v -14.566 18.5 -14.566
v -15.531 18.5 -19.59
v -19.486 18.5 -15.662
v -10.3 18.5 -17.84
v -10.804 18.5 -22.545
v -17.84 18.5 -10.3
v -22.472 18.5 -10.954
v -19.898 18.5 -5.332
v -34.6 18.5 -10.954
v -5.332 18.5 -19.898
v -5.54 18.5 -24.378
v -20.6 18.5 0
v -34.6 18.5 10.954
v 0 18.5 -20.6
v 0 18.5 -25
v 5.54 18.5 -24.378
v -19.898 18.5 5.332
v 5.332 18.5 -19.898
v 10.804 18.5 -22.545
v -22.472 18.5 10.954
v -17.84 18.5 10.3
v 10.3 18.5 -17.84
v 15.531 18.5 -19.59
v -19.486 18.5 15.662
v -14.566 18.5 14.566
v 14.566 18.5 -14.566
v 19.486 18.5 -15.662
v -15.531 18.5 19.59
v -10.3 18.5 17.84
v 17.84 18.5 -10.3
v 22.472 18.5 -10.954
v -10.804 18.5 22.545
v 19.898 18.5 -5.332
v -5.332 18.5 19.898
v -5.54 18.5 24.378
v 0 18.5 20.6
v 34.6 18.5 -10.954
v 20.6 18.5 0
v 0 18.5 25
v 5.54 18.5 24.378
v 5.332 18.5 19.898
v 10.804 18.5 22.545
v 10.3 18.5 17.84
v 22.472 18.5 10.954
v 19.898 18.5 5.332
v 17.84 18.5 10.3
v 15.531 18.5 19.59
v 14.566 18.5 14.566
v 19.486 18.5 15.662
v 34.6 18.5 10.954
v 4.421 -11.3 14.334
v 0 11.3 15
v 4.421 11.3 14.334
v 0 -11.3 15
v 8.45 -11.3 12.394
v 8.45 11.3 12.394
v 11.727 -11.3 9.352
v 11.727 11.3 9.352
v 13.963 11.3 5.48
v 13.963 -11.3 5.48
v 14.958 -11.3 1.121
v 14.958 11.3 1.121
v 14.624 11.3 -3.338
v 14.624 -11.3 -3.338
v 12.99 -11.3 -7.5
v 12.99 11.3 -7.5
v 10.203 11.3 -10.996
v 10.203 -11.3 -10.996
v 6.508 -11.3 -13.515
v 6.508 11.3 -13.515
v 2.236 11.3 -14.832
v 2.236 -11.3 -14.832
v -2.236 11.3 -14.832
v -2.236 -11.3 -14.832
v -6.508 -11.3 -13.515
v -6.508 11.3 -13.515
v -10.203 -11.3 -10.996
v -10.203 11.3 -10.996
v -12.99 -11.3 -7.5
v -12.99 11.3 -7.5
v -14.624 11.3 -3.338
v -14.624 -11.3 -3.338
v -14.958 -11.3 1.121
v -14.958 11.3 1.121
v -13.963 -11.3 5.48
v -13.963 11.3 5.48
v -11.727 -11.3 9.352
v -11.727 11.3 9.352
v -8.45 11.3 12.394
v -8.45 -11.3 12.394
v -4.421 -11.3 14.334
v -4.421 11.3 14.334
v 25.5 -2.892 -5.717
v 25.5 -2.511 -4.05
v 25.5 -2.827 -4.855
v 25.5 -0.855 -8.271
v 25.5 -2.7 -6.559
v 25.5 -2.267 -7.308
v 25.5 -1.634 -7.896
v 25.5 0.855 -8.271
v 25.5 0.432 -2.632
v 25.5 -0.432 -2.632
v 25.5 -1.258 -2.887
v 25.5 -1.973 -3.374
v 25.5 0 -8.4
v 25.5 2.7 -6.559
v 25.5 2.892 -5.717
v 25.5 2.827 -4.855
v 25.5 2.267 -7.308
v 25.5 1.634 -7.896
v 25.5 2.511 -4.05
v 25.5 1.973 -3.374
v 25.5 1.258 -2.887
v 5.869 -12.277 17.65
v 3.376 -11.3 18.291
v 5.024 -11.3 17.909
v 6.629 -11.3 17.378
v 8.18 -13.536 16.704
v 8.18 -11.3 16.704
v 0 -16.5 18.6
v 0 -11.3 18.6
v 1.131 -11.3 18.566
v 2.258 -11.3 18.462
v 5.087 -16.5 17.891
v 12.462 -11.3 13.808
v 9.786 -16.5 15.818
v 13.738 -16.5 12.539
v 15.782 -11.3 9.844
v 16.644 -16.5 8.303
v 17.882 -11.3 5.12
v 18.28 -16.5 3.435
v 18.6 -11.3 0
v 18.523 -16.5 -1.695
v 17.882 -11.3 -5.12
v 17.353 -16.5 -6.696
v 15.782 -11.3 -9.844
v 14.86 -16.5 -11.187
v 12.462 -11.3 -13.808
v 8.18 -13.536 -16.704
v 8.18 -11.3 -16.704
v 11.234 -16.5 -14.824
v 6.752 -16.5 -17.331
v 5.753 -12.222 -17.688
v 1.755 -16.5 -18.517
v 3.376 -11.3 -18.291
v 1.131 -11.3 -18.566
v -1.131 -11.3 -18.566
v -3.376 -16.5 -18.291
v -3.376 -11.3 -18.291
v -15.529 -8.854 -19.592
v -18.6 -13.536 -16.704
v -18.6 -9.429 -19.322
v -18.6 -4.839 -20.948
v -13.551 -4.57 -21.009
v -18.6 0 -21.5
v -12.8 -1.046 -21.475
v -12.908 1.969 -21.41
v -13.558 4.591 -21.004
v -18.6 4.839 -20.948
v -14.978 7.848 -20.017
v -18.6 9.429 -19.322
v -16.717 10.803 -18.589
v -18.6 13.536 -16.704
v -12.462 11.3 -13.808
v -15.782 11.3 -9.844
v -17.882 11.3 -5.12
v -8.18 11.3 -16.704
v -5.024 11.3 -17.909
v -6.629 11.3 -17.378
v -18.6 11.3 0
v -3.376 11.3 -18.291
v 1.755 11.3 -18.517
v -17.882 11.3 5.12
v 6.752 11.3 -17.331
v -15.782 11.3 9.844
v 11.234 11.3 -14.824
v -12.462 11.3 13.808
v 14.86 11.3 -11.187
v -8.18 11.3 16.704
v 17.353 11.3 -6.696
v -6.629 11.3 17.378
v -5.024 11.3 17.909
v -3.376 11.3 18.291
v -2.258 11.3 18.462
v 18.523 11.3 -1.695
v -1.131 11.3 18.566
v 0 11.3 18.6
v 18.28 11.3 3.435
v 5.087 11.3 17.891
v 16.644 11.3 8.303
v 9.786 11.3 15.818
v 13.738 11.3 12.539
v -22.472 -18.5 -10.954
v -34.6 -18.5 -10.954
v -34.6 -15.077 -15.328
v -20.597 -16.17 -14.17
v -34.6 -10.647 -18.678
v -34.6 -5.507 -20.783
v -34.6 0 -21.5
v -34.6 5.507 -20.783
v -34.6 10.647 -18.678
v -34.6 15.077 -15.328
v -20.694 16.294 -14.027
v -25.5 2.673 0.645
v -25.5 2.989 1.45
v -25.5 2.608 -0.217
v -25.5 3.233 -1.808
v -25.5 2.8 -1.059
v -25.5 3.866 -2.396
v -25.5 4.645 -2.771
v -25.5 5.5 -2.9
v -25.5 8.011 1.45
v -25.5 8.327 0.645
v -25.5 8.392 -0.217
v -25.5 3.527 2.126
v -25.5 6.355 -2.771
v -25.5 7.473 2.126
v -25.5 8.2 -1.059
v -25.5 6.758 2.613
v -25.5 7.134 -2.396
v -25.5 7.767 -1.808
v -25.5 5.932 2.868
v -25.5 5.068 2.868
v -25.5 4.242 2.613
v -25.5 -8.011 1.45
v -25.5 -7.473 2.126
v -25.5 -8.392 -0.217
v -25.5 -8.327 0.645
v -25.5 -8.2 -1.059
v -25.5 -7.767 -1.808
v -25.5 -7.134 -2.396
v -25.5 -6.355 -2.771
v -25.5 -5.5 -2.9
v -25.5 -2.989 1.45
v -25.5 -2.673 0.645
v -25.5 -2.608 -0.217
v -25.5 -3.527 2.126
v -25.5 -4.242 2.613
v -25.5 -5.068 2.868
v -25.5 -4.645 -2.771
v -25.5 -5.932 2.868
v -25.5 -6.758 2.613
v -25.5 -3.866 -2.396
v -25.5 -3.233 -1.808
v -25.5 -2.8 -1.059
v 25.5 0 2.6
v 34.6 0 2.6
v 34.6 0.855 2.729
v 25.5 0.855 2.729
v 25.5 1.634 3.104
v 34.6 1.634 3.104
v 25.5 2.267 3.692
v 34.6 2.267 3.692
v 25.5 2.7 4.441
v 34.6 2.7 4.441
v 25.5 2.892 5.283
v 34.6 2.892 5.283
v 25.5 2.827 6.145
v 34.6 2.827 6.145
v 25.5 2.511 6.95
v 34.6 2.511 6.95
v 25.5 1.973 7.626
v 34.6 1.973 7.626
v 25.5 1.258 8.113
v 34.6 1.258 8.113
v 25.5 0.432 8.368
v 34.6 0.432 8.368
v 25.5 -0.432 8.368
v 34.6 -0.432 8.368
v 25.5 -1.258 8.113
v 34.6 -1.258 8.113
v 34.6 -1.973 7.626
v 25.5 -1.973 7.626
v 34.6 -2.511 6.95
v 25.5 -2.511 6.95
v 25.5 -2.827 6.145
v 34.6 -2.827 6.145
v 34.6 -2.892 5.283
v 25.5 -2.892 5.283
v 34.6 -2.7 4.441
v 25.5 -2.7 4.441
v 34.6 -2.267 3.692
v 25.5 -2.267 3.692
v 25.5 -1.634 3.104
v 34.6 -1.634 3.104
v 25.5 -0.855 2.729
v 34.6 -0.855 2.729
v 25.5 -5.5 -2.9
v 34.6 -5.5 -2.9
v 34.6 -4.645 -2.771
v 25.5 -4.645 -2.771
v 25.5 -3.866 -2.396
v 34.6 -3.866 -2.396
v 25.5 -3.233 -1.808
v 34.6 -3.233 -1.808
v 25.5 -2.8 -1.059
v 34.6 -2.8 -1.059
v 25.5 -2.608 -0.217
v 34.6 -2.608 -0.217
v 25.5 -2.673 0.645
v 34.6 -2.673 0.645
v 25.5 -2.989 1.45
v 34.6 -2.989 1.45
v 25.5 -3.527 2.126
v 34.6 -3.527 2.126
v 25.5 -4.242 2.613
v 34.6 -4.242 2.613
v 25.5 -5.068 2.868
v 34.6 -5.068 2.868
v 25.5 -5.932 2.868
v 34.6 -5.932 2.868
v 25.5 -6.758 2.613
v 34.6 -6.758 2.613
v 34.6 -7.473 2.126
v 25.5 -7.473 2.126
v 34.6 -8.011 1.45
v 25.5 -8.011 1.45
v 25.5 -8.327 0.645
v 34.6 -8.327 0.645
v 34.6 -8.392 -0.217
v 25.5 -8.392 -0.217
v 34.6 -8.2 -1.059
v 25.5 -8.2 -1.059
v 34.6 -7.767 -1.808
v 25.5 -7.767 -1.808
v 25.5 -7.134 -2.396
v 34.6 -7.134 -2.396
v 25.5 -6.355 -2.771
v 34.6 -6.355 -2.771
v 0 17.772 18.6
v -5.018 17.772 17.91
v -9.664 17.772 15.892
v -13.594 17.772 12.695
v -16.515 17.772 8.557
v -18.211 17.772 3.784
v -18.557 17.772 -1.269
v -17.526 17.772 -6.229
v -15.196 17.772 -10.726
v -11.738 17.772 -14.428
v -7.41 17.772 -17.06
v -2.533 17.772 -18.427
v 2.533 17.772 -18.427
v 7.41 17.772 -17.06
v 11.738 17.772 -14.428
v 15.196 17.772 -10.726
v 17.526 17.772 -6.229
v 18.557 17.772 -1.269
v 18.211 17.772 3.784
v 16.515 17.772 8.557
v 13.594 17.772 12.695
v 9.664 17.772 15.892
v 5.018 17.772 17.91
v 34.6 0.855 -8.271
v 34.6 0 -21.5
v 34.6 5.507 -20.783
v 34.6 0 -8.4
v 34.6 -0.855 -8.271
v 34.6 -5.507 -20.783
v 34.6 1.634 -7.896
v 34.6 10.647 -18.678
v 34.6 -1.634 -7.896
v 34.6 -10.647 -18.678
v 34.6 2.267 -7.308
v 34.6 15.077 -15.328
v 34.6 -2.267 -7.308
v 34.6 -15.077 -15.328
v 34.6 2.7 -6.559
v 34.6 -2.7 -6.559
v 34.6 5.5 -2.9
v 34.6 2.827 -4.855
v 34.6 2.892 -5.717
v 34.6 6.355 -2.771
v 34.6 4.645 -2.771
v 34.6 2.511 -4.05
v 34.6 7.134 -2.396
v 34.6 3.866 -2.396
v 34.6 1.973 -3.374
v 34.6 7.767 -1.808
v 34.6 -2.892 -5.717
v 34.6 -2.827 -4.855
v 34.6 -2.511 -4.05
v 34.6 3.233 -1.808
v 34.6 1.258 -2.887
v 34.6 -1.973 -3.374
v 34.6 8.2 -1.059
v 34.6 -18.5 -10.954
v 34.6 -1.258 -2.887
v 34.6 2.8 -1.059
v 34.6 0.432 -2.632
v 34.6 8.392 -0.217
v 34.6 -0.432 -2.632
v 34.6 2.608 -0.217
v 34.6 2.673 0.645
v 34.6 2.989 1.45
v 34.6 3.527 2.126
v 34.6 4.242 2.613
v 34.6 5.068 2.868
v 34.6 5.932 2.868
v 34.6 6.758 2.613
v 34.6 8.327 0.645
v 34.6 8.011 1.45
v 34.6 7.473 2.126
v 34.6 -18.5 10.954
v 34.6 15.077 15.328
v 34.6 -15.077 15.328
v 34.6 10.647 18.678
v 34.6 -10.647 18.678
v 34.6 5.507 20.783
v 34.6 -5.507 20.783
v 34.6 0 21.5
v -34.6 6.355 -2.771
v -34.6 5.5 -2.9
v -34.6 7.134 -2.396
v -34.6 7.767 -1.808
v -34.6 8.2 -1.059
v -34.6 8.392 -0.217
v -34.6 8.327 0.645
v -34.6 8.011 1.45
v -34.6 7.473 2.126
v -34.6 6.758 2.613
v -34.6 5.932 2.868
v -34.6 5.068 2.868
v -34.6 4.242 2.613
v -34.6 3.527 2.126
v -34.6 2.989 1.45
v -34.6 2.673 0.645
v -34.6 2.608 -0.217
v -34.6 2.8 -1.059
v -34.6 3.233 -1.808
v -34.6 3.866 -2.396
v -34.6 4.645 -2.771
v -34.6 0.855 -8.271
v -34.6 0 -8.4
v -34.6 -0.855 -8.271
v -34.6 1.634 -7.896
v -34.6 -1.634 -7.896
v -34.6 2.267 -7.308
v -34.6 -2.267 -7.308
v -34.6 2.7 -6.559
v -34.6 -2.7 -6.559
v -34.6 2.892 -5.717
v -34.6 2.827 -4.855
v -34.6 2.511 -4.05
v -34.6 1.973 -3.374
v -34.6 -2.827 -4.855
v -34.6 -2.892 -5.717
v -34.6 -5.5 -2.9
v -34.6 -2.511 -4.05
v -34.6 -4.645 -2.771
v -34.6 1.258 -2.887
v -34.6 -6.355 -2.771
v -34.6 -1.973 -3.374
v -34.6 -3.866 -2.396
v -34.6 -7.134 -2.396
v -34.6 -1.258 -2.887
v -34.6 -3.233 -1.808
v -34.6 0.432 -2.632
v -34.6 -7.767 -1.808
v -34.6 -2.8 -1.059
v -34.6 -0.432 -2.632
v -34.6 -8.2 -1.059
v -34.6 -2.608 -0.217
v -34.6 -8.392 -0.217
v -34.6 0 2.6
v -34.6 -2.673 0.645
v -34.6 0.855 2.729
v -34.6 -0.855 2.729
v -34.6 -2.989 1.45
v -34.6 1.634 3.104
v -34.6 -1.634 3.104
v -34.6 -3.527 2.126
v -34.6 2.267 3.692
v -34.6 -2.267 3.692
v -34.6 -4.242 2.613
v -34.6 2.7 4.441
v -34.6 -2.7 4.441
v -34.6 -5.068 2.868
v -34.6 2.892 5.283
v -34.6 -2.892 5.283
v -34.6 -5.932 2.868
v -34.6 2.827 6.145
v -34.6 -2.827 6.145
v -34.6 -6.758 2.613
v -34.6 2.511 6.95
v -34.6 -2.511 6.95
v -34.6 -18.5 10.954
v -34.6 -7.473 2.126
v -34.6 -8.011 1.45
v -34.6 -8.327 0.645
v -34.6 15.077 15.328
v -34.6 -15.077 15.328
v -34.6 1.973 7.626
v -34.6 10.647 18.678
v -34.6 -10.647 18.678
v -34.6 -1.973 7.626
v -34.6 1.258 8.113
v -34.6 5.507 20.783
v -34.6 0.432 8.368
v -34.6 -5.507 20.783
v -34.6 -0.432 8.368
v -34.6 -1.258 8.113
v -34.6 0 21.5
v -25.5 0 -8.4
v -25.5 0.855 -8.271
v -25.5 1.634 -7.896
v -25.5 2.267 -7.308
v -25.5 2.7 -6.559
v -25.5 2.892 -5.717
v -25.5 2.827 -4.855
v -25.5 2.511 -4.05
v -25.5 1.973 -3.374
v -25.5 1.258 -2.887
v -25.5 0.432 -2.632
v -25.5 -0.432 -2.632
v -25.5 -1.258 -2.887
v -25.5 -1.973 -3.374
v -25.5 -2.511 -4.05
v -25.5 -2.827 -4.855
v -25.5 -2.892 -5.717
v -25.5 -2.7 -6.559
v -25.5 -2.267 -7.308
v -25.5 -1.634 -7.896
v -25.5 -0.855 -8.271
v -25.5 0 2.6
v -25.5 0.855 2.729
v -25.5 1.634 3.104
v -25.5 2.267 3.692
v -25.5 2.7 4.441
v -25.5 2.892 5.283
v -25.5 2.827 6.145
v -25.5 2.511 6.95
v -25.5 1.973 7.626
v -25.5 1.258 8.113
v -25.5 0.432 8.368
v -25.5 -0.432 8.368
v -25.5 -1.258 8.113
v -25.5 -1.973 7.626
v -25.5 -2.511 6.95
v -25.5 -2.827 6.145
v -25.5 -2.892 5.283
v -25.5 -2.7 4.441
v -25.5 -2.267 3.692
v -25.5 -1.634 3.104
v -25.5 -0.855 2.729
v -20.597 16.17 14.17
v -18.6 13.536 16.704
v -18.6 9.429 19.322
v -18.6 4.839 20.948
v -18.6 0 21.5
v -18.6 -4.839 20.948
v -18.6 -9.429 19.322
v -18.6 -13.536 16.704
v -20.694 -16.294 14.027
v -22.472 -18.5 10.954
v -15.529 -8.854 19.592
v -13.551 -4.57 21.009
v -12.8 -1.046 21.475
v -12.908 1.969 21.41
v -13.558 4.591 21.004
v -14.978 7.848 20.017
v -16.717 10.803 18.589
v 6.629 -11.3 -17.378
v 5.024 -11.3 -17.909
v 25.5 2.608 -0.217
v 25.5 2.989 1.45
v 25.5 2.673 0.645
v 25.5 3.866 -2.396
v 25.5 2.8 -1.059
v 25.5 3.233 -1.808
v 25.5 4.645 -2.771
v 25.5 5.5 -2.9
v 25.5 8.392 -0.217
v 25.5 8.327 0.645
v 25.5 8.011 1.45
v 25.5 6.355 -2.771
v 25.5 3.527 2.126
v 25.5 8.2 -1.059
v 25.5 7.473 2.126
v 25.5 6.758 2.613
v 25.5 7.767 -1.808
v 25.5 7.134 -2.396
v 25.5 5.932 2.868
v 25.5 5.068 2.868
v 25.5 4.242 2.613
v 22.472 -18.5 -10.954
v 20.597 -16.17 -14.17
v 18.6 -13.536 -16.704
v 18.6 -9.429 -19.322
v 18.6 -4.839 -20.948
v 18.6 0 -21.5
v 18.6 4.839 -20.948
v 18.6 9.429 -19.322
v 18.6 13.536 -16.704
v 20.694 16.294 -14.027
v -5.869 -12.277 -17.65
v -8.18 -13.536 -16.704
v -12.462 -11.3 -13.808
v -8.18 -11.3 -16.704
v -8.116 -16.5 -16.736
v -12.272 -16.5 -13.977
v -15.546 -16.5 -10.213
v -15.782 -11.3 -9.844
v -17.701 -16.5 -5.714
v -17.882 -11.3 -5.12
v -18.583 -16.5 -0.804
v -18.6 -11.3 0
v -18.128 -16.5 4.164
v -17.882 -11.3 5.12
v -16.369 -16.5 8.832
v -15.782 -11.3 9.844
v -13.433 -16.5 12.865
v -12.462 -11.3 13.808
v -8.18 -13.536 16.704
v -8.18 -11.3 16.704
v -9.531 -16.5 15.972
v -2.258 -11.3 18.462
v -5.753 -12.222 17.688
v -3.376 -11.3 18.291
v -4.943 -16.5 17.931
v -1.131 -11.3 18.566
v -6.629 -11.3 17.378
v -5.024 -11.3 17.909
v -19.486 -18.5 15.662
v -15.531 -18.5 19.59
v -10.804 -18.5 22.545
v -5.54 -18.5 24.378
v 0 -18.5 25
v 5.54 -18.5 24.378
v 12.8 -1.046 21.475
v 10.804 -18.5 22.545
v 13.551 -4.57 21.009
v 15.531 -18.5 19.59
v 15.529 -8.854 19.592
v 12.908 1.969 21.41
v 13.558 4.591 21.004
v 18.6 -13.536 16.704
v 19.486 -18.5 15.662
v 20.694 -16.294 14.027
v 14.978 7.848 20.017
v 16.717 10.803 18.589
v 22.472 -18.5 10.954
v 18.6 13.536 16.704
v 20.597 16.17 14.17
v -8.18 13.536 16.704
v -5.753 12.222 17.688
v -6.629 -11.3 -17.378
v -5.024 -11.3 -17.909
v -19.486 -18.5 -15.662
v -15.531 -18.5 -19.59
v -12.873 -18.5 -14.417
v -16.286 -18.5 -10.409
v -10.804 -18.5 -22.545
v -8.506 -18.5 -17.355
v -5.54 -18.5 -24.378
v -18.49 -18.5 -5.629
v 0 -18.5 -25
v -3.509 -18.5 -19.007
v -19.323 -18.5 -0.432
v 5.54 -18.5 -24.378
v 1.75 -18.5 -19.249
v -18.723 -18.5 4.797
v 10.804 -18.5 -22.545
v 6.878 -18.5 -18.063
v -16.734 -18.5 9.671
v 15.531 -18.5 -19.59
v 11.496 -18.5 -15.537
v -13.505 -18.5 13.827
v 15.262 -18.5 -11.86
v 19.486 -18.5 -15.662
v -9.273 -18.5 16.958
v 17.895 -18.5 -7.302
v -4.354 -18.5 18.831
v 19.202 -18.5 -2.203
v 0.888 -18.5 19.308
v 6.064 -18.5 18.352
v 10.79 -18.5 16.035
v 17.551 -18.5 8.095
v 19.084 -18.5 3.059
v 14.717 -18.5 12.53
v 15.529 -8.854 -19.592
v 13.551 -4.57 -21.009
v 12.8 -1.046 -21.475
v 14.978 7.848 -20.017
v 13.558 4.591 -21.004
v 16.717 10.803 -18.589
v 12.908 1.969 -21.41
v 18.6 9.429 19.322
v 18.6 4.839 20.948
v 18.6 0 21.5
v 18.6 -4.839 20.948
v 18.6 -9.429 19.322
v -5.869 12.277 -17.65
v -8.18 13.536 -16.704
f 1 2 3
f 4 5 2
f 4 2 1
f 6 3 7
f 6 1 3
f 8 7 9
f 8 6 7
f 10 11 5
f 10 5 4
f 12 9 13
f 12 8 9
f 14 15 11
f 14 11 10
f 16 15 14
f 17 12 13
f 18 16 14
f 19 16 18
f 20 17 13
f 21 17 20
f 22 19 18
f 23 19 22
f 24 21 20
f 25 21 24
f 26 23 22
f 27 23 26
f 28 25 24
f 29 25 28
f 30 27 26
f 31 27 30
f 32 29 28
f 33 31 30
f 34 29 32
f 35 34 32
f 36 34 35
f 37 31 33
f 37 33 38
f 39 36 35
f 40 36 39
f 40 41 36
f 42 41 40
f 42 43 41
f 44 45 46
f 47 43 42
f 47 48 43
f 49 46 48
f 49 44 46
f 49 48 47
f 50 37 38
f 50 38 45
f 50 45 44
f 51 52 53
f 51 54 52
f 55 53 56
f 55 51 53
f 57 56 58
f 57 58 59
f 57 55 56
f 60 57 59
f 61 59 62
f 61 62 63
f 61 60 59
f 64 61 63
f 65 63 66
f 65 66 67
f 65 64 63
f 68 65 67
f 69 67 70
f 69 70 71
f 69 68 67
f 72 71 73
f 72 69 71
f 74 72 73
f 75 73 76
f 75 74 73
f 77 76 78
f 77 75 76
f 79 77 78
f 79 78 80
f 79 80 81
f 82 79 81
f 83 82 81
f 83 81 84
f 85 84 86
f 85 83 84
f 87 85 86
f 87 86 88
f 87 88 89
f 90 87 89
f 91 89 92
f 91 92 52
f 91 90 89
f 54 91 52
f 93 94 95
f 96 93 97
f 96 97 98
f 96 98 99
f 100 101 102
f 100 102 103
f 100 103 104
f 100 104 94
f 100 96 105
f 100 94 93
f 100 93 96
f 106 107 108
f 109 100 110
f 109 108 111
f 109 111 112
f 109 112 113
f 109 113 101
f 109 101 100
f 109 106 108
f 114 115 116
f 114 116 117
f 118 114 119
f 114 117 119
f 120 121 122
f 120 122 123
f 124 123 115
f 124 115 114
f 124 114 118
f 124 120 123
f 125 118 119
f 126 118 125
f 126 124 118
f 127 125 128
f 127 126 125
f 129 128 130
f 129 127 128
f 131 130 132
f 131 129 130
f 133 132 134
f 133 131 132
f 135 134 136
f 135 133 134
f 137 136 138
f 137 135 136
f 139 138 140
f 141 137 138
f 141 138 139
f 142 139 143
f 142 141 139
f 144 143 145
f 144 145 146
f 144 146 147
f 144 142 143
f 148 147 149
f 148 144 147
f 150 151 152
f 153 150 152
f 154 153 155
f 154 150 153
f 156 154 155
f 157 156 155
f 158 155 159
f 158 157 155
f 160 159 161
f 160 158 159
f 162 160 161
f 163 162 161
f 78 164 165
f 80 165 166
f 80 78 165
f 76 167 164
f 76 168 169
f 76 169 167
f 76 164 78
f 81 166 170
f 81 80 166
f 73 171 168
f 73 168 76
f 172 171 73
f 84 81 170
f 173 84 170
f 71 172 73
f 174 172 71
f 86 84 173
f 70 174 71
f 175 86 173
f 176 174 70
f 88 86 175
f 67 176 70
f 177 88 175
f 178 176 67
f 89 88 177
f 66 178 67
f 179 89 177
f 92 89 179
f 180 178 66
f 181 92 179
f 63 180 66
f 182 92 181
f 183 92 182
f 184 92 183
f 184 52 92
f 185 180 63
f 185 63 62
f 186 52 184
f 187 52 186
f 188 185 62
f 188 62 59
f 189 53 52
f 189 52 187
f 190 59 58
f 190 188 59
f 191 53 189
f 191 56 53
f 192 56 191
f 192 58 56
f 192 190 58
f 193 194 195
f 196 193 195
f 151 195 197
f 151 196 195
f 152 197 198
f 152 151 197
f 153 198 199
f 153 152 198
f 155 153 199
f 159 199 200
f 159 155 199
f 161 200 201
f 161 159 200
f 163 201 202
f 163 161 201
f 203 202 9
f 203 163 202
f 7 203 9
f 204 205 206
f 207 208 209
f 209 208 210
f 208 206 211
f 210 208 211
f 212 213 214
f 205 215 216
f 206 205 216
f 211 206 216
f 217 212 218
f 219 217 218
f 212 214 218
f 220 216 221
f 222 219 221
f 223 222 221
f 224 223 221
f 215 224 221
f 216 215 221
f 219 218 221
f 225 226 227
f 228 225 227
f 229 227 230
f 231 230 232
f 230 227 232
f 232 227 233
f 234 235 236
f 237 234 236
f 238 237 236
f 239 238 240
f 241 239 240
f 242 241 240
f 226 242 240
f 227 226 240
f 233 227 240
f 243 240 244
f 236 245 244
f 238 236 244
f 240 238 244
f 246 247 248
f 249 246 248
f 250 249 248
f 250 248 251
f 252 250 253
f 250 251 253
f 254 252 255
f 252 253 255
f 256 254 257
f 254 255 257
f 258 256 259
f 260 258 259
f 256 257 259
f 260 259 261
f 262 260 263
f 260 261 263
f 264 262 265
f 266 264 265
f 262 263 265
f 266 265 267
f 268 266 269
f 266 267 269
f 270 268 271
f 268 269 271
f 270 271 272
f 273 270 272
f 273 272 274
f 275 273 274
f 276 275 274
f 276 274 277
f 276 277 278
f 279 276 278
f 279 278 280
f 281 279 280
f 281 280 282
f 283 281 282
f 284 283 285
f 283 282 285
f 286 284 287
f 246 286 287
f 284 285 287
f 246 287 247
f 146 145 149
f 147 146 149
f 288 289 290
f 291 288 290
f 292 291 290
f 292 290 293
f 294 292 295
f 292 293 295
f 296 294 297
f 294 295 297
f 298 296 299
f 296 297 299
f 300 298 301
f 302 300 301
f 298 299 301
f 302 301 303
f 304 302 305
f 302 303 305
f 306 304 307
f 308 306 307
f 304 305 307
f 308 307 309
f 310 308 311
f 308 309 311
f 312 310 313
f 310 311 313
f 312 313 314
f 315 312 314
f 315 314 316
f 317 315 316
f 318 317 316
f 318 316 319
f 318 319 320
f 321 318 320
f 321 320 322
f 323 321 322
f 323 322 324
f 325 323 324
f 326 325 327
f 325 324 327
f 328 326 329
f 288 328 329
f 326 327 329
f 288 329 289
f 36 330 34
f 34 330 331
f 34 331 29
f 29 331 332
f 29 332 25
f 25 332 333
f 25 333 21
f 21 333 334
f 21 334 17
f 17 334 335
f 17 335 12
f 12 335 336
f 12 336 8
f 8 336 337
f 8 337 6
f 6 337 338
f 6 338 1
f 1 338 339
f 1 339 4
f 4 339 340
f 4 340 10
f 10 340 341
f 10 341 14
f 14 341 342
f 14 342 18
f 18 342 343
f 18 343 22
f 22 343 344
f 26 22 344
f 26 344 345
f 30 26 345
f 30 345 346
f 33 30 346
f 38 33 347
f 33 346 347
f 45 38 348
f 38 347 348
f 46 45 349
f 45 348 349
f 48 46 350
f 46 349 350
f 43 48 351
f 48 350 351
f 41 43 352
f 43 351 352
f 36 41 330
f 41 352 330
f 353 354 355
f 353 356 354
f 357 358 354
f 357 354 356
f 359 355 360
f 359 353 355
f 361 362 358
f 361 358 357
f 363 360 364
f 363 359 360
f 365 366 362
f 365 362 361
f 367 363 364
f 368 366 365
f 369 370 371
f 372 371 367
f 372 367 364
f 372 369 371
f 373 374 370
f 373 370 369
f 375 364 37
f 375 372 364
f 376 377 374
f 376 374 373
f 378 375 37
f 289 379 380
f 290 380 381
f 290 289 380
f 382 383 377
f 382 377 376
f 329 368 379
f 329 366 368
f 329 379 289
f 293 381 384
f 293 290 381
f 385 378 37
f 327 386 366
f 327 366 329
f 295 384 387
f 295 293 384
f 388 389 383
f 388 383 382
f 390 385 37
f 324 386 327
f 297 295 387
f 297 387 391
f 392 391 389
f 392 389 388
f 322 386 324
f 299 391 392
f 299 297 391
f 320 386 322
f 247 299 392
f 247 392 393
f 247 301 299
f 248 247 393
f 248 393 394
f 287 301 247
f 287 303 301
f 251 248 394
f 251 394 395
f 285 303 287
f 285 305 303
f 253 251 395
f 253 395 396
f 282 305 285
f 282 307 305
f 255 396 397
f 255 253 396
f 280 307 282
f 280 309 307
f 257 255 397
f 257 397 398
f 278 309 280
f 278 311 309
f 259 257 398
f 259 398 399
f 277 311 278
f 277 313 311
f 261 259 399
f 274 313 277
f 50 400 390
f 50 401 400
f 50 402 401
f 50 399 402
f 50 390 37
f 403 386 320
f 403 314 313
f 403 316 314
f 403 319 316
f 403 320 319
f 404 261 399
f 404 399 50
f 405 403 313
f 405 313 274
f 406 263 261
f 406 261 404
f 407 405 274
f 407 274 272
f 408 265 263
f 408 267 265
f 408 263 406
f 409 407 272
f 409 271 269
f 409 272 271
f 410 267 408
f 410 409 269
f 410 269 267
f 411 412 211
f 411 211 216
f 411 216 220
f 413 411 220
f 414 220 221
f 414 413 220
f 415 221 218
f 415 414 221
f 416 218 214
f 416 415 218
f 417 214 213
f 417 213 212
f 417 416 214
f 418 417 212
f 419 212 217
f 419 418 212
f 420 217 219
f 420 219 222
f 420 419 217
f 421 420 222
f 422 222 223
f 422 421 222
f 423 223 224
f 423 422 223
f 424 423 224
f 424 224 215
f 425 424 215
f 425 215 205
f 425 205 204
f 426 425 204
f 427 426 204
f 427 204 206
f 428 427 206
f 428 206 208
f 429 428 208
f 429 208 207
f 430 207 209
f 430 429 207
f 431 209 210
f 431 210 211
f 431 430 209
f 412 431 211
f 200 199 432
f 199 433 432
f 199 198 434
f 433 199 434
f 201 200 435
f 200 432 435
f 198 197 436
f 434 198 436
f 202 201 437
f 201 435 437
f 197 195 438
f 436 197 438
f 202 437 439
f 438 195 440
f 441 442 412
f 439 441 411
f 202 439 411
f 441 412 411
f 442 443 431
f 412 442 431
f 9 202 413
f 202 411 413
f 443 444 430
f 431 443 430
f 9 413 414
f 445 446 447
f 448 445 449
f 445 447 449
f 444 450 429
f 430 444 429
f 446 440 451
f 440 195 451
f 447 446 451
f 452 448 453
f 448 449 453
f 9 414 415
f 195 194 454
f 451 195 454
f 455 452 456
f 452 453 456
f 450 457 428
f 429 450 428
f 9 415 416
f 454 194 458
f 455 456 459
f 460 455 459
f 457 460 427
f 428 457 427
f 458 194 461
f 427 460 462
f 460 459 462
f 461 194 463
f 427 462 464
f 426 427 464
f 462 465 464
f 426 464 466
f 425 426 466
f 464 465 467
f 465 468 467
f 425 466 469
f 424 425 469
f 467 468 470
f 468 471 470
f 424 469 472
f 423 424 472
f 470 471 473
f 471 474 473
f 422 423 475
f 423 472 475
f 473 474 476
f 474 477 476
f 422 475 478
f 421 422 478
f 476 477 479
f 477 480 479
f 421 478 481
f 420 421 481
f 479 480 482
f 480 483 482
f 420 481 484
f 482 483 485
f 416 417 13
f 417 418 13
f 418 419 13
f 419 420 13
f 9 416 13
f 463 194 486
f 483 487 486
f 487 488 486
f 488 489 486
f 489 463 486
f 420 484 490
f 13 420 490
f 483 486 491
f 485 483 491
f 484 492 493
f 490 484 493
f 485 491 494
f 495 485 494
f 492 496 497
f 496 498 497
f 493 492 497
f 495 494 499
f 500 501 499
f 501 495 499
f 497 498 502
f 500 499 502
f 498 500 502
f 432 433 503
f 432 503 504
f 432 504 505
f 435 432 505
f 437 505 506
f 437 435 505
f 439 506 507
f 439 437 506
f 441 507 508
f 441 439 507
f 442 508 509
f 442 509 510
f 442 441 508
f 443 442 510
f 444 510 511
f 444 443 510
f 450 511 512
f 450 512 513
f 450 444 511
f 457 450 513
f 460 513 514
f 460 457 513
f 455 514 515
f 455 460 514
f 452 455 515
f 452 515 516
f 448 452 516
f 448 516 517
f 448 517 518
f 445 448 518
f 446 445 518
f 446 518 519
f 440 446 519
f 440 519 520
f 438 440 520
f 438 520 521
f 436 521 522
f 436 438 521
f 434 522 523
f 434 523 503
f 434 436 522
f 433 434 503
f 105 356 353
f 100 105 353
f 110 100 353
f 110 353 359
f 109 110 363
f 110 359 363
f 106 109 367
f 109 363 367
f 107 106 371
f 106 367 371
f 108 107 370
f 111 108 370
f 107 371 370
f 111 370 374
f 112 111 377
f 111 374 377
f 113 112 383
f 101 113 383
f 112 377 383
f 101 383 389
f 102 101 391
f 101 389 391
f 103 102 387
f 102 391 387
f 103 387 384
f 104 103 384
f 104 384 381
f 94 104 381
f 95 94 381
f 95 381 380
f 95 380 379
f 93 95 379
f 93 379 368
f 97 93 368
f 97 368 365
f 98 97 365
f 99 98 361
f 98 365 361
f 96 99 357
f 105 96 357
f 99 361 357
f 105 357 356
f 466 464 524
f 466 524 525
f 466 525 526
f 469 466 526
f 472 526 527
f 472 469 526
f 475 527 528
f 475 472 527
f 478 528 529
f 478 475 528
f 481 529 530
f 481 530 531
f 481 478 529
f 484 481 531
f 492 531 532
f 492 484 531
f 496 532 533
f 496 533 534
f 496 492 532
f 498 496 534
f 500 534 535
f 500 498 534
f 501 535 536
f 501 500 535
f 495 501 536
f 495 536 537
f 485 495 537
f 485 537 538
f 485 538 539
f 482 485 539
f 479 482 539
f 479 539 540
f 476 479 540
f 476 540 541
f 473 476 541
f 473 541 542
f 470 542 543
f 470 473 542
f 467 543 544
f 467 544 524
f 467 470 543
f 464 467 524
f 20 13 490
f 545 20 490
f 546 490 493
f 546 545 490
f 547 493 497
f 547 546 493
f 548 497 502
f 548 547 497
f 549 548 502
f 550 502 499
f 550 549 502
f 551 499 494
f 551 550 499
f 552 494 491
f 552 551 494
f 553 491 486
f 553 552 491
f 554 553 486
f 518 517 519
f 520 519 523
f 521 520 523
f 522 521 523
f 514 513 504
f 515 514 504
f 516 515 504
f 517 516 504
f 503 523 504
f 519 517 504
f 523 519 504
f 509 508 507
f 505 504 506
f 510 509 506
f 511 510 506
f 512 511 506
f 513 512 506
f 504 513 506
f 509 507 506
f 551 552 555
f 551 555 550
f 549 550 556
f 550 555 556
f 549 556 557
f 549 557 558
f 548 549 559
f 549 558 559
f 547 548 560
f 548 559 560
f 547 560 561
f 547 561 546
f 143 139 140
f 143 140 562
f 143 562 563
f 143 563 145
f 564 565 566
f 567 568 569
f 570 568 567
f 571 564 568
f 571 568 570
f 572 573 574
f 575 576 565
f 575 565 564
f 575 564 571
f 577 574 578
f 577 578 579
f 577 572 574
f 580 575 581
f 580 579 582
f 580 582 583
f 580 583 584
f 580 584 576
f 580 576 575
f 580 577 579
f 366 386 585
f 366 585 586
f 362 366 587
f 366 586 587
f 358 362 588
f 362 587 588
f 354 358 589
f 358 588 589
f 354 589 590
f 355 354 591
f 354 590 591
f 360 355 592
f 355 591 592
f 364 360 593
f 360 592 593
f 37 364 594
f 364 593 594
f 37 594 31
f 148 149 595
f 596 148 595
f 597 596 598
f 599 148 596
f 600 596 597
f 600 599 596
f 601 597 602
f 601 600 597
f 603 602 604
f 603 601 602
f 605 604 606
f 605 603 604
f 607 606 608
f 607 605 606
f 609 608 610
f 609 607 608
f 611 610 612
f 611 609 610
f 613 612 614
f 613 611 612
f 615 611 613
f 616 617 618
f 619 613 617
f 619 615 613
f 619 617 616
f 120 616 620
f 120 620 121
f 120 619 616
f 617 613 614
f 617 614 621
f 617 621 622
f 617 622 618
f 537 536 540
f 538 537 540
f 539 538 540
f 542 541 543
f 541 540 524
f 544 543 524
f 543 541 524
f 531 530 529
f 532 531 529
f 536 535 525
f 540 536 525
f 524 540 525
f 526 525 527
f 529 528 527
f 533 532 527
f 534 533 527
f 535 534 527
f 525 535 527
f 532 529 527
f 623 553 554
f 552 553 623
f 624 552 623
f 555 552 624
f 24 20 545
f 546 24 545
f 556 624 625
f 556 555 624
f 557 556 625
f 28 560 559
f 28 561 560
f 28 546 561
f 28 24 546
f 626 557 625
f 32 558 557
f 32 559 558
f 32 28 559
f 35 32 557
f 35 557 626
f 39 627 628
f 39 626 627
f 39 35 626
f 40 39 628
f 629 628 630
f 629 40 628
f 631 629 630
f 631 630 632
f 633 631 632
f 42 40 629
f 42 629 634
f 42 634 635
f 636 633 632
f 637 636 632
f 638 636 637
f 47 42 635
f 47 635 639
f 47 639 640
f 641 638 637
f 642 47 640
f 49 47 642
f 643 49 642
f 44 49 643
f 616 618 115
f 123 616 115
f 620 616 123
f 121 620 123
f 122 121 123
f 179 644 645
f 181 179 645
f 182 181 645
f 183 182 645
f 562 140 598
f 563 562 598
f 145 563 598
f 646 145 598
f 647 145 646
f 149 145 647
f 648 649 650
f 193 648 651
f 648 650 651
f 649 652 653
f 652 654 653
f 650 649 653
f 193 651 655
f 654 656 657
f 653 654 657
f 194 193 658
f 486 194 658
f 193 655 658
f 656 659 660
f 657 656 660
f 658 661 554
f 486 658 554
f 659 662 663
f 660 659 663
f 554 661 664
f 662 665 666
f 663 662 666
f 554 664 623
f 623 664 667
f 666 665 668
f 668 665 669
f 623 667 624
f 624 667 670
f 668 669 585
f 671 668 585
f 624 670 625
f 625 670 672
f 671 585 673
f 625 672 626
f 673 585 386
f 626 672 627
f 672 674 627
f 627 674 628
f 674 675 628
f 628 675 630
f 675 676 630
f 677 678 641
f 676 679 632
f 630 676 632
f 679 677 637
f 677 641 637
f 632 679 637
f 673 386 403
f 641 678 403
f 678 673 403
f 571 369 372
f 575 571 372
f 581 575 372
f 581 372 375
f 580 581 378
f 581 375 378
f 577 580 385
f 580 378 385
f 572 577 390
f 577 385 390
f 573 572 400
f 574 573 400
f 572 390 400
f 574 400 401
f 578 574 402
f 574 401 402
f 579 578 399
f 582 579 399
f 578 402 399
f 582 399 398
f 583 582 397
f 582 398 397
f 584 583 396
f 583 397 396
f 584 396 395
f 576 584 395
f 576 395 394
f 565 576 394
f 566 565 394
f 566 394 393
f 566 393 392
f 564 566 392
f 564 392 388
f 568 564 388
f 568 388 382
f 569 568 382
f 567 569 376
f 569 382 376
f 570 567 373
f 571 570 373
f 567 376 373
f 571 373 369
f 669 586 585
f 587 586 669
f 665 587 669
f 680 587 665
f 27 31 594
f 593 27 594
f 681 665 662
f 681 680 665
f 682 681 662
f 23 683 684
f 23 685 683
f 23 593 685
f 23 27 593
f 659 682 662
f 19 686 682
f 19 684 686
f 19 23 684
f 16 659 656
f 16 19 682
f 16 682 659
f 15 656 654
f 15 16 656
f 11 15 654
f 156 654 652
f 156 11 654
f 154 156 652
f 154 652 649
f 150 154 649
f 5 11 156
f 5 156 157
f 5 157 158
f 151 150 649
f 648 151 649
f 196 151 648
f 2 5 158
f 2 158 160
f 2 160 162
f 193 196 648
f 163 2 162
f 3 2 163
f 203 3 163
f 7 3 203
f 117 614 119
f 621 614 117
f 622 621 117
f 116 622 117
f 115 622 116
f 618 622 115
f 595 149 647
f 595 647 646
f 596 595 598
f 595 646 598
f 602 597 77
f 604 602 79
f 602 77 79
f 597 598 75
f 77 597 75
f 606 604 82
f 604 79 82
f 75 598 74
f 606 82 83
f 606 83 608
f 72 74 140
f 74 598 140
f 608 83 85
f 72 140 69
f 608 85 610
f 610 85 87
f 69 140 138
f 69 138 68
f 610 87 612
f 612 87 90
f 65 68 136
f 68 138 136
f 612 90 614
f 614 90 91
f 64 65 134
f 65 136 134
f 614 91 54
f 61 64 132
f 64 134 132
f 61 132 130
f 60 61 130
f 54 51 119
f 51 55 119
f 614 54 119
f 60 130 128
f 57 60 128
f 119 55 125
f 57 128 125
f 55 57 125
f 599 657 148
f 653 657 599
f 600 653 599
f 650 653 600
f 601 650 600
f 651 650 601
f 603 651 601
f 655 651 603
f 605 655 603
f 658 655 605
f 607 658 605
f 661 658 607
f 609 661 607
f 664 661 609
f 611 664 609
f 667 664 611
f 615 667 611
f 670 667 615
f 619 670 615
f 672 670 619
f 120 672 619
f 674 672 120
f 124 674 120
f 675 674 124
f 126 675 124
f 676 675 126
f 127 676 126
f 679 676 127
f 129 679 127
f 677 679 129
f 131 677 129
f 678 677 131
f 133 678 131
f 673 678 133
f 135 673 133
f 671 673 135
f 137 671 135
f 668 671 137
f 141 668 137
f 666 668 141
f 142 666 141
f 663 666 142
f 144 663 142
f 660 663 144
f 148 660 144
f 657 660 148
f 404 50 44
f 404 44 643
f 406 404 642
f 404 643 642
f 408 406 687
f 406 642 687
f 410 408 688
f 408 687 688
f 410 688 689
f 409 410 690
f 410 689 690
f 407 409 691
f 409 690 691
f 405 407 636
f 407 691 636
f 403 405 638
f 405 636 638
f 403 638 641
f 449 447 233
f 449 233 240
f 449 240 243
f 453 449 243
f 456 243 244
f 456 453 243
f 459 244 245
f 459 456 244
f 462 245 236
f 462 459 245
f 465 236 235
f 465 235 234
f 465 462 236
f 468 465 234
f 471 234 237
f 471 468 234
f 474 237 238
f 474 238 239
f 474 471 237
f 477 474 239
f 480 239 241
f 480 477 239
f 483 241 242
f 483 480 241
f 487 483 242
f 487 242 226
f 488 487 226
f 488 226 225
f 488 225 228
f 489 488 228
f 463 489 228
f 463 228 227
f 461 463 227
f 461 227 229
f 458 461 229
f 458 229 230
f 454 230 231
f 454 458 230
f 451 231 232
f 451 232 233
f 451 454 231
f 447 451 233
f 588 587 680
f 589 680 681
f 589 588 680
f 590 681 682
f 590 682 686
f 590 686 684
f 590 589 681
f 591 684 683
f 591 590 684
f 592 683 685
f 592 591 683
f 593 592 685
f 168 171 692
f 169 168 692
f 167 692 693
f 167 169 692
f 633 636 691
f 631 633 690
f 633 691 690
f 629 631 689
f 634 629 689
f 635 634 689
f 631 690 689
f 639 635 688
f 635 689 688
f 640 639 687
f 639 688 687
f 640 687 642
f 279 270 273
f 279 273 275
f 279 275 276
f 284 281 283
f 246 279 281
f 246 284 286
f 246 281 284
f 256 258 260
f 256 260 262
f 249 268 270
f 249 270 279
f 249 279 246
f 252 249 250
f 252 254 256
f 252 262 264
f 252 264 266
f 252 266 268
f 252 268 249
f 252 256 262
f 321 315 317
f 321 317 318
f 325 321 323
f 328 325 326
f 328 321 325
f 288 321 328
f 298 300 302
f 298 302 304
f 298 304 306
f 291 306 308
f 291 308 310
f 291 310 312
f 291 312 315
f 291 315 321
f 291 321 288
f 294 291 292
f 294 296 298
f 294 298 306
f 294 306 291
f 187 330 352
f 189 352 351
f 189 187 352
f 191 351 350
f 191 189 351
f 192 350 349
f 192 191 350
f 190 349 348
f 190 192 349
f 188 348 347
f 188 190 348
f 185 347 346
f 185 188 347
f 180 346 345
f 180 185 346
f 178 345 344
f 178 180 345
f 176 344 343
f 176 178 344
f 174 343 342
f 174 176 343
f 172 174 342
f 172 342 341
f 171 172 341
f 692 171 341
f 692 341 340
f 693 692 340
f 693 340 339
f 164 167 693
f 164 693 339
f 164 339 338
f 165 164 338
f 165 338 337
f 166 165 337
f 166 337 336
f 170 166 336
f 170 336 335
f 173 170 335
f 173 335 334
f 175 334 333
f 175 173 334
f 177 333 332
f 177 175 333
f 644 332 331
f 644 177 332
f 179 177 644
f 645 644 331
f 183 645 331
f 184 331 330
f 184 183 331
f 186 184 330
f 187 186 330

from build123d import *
from OCP.BRepFilletAPI import BRepFilletAPI_MakeChamfer
from build123d.topology import SkipClean

# Parameters (mm, degrees)
SKIZZE1_R                            = 25
SKIZZE1_R_2                          = 18.6
AUFSATZ_LINEAR_AUSTRAGEN1_DEPTH      = 18.5
SKIZZE2_R                            = 18.6
SKIZZE2_R_2                          = 15
AUFSATZ_LINEAR_AUSTRAGEN2_DEPTH      = 11.3
SKIZZE3_R                            = 21.5
AUFSATZ_LINEAR_AUSTRAGEN3_DEPTH      = 16
SKIZZE4_R                            = 2.9
SCHNITT_LINEAR_AUSTRAGEN1_DEPTH      = 9.1
SKIZZE5_OUTSIDE_W                    = 64.118
SKIZZE5_OUTSIDE_H                    = 71.118
SKIZZE5_OUTSIDE_W_2                  = 37
SKIZZE5_OUTSIDE_H_2                  = 50
SCHNITT_LINEAR_AUSTRAGEN2_DEPTH      = 67.342867843
SCHNITT_LINEAR_AUSTRAGEN2_DEPTH_BACK = 67.342867843
AUFSATZ_LINEAR_AUSTRAGEN4_DEPTH      = 37.2
SKIZZE8_R                            = 18.6
SCHNITT_LINEAR_AUSTRAGEN3_DEPTH      = 53.059581422
FASE1_SIZE                           = 2
FASE1_SIZE2                          = 0.727940469


with BuildPart() as part:
    # Skizze1 → Aufsatz-Linear austragen1 (new, symmetric)
    with BuildSketch(Plane(origin=(0, 0, 0), x_dir=(1, 0, 0), z_dir=(0, 1, 0))):
        with Locations(Location((0, 0, 0), (0, 0, 270))):
            Circle(SKIZZE1_R)
        with Locations(Location((0, 0, 0), (0, 0, 270))):
            Circle(SKIZZE1_R_2, mode=Mode.SUBTRACT)
    extrude(amount=AUFSATZ_LINEAR_AUSTRAGEN1_DEPTH, both=True)

    # Skizze2 → Aufsatz-Linear austragen2 (add, symmetric)
    with BuildSketch(Plane(origin=(0, 0, 0), x_dir=(1, 0, 0), z_dir=(0, 1, 0))):
        with Locations(Location((0, 0, 0), (0, 0, 270))):
            Circle(SKIZZE2_R)
        with Locations(Location((0, 0, 0), (0, 0, 270))):
            Circle(SKIZZE2_R_2, mode=Mode.SUBTRACT)
    extrude(amount=AUFSATZ_LINEAR_AUSTRAGEN2_DEPTH, both=True)

    # Skizze3 → Aufsatz-Linear austragen3 (add)
    with BuildSketch(Plane(origin=(18.6, 0, 0), x_dir=(0, 0, -1), z_dir=(1, 0, 0))):
        with Locations(Location((0, 0, 0), (0, 0, 140.982439232))):
            Circle(SKIZZE3_R)
    aufsatz_linear_austragen3 = extrude(amount=AUFSATZ_LINEAR_AUSTRAGEN3_DEPTH)

    # Skizze4 → Schnitt-Linear austragen1 (cut)
    with BuildSketch(Plane(origin=(34.6, 0, 0), x_dir=(0, 0, -1), z_dir=(1, 0, 0))):
        with Locations((-5.5, 0)):
            Circle(SKIZZE4_R)
        with Locations((0, 5.5)):
            Circle(SKIZZE4_R)
        with Locations((5.5, 0)):
            Circle(SKIZZE4_R)
        with Locations((0, -5.5)):
            Circle(SKIZZE4_R)
    schnitt_linear_austragen1 = extrude(amount=-SCHNITT_LINEAR_AUSTRAGEN1_DEPTH, mode=Mode.SUBTRACT)

    # Spiegeln1: Aufsatz-Linear austragen3, Schnitt-Linear austragen1 across plane
    add(aufsatz_linear_austragen3.mirror(Plane(origin=(0, 0, 0), x_dir=(0, 0, 1), z_dir=(1, 0, 0))))
    add(schnitt_linear_austragen1.mirror(Plane(origin=(0, 0, 0), x_dir=(0, 0, 1), z_dir=(1, 0, 0))), mode=Mode.SUBTRACT)

    # Skizze5 outside → Schnitt-Linear austragen2 (cut, two sides)
    with BuildSketch(Plane(origin=(0, 29.28598322, 0), x_dir=(0, -1, 0), z_dir=(-1, 0, 0))) as schnitt_linear_austragen2_sk:
        with Locations((29.286, 0)):
            Rectangle(SKIZZE5_OUTSIDE_W, SKIZZE5_OUTSIDE_H)
        with Locations((29.28598322, 0)):
            Rectangle(SKIZZE5_OUTSIDE_W_2, SKIZZE5_OUTSIDE_H_2, mode=Mode.SUBTRACT)
    extrude(amount=SCHNITT_LINEAR_AUSTRAGEN2_DEPTH, mode=Mode.SUBTRACT)
    extrude(schnitt_linear_austragen2_sk.sketch, amount=-SCHNITT_LINEAR_AUSTRAGEN2_DEPTH_BACK, mode=Mode.SUBTRACT)

    # Skizze7 → Aufsatz-Linear austragen4 (add)
    with BuildSketch(Plane.ZY.offset(-18.6)):
        with BuildLine():
            Line((16.704490414, 13.535508856), (16.704490414, -13.535508856))
            ThreePointArc((16.704490414, -13.535508856), (21.5, 0), (16.704490414, 13.535508856))
        make_face()
    aufsatz_linear_austragen4 = extrude(amount=AUFSATZ_LINEAR_AUSTRAGEN4_DEPTH)

    # Spiegeln2: Aufsatz-Linear austragen4 across plane
    add(aufsatz_linear_austragen4.mirror(Plane.XY))

    # Skizze8 → Schnitt-Linear austragen3 (cut, through all)
    with BuildSketch(Plane(origin=(0, 11.3, 0), x_dir=(1, 0, 0), z_dir=(0, 1, 0))):
        with Locations(Location((0, 0, 0), (0, 0, 100.458673289))):
            Circle(SKIZZE8_R)
    schnitt_linear_austragen3 = extrude(amount=SCHNITT_LINEAR_AUSTRAGEN3_DEPTH, mode=Mode.SUBTRACT)

    # Spiegeln3: Schnitt-Linear austragen3 across plane
    with SkipClean():  # the faces are left unmerged after this step: merging them gives an invalid solid
        add(schnitt_linear_austragen3.mirror(Plane.ZX), mode=Mode.SUBTRACT)

    # Fase1: one chamfer whose edges measure the first distance from different faces: ONE call of the kernel's chamfer builder (chamfer() names one face for all edges)
    fase1_edges_1 = [part.edges().sort_by_distance(p)[0] for p in [
        (18.522584239, -18.5, -1.695250166),
    ]]
    fase1_side_1 = [part.faces().sort_by_distance(p)[0] for p in [
        (18.522584239, -14.9, -1.695250166),
    ]]
    fase1_edges_2 = [part.edges().sort_by_distance(p)[0] for p in [
        (0, 18.5, -18.6),
    ]]
    fase1_side_2 = [part.faces().sort_by_distance(p)[0] for p in [
        (0, 18.5, 24.146264678),
    ]]
    fase1 = BRepFilletAPI_MakeChamfer(part.part.solid().wrapped)
    for e in fase1_edges_1:
        fase1.Add(FASE1_SIZE, FASE1_SIZE2, e.wrapped, fase1_side_1[0].wrapped)  # the first distance lies on this face
    for e in fase1_edges_2:
        fase1.Add(FASE1_SIZE, FASE1_SIZE2, e.wrapped, fase1_side_2[0].wrapped)  # the first distance lies on this face
    add(Compound.cast(fase1.Shape()), mode=Mode.REPLACE)


solid = part.part
